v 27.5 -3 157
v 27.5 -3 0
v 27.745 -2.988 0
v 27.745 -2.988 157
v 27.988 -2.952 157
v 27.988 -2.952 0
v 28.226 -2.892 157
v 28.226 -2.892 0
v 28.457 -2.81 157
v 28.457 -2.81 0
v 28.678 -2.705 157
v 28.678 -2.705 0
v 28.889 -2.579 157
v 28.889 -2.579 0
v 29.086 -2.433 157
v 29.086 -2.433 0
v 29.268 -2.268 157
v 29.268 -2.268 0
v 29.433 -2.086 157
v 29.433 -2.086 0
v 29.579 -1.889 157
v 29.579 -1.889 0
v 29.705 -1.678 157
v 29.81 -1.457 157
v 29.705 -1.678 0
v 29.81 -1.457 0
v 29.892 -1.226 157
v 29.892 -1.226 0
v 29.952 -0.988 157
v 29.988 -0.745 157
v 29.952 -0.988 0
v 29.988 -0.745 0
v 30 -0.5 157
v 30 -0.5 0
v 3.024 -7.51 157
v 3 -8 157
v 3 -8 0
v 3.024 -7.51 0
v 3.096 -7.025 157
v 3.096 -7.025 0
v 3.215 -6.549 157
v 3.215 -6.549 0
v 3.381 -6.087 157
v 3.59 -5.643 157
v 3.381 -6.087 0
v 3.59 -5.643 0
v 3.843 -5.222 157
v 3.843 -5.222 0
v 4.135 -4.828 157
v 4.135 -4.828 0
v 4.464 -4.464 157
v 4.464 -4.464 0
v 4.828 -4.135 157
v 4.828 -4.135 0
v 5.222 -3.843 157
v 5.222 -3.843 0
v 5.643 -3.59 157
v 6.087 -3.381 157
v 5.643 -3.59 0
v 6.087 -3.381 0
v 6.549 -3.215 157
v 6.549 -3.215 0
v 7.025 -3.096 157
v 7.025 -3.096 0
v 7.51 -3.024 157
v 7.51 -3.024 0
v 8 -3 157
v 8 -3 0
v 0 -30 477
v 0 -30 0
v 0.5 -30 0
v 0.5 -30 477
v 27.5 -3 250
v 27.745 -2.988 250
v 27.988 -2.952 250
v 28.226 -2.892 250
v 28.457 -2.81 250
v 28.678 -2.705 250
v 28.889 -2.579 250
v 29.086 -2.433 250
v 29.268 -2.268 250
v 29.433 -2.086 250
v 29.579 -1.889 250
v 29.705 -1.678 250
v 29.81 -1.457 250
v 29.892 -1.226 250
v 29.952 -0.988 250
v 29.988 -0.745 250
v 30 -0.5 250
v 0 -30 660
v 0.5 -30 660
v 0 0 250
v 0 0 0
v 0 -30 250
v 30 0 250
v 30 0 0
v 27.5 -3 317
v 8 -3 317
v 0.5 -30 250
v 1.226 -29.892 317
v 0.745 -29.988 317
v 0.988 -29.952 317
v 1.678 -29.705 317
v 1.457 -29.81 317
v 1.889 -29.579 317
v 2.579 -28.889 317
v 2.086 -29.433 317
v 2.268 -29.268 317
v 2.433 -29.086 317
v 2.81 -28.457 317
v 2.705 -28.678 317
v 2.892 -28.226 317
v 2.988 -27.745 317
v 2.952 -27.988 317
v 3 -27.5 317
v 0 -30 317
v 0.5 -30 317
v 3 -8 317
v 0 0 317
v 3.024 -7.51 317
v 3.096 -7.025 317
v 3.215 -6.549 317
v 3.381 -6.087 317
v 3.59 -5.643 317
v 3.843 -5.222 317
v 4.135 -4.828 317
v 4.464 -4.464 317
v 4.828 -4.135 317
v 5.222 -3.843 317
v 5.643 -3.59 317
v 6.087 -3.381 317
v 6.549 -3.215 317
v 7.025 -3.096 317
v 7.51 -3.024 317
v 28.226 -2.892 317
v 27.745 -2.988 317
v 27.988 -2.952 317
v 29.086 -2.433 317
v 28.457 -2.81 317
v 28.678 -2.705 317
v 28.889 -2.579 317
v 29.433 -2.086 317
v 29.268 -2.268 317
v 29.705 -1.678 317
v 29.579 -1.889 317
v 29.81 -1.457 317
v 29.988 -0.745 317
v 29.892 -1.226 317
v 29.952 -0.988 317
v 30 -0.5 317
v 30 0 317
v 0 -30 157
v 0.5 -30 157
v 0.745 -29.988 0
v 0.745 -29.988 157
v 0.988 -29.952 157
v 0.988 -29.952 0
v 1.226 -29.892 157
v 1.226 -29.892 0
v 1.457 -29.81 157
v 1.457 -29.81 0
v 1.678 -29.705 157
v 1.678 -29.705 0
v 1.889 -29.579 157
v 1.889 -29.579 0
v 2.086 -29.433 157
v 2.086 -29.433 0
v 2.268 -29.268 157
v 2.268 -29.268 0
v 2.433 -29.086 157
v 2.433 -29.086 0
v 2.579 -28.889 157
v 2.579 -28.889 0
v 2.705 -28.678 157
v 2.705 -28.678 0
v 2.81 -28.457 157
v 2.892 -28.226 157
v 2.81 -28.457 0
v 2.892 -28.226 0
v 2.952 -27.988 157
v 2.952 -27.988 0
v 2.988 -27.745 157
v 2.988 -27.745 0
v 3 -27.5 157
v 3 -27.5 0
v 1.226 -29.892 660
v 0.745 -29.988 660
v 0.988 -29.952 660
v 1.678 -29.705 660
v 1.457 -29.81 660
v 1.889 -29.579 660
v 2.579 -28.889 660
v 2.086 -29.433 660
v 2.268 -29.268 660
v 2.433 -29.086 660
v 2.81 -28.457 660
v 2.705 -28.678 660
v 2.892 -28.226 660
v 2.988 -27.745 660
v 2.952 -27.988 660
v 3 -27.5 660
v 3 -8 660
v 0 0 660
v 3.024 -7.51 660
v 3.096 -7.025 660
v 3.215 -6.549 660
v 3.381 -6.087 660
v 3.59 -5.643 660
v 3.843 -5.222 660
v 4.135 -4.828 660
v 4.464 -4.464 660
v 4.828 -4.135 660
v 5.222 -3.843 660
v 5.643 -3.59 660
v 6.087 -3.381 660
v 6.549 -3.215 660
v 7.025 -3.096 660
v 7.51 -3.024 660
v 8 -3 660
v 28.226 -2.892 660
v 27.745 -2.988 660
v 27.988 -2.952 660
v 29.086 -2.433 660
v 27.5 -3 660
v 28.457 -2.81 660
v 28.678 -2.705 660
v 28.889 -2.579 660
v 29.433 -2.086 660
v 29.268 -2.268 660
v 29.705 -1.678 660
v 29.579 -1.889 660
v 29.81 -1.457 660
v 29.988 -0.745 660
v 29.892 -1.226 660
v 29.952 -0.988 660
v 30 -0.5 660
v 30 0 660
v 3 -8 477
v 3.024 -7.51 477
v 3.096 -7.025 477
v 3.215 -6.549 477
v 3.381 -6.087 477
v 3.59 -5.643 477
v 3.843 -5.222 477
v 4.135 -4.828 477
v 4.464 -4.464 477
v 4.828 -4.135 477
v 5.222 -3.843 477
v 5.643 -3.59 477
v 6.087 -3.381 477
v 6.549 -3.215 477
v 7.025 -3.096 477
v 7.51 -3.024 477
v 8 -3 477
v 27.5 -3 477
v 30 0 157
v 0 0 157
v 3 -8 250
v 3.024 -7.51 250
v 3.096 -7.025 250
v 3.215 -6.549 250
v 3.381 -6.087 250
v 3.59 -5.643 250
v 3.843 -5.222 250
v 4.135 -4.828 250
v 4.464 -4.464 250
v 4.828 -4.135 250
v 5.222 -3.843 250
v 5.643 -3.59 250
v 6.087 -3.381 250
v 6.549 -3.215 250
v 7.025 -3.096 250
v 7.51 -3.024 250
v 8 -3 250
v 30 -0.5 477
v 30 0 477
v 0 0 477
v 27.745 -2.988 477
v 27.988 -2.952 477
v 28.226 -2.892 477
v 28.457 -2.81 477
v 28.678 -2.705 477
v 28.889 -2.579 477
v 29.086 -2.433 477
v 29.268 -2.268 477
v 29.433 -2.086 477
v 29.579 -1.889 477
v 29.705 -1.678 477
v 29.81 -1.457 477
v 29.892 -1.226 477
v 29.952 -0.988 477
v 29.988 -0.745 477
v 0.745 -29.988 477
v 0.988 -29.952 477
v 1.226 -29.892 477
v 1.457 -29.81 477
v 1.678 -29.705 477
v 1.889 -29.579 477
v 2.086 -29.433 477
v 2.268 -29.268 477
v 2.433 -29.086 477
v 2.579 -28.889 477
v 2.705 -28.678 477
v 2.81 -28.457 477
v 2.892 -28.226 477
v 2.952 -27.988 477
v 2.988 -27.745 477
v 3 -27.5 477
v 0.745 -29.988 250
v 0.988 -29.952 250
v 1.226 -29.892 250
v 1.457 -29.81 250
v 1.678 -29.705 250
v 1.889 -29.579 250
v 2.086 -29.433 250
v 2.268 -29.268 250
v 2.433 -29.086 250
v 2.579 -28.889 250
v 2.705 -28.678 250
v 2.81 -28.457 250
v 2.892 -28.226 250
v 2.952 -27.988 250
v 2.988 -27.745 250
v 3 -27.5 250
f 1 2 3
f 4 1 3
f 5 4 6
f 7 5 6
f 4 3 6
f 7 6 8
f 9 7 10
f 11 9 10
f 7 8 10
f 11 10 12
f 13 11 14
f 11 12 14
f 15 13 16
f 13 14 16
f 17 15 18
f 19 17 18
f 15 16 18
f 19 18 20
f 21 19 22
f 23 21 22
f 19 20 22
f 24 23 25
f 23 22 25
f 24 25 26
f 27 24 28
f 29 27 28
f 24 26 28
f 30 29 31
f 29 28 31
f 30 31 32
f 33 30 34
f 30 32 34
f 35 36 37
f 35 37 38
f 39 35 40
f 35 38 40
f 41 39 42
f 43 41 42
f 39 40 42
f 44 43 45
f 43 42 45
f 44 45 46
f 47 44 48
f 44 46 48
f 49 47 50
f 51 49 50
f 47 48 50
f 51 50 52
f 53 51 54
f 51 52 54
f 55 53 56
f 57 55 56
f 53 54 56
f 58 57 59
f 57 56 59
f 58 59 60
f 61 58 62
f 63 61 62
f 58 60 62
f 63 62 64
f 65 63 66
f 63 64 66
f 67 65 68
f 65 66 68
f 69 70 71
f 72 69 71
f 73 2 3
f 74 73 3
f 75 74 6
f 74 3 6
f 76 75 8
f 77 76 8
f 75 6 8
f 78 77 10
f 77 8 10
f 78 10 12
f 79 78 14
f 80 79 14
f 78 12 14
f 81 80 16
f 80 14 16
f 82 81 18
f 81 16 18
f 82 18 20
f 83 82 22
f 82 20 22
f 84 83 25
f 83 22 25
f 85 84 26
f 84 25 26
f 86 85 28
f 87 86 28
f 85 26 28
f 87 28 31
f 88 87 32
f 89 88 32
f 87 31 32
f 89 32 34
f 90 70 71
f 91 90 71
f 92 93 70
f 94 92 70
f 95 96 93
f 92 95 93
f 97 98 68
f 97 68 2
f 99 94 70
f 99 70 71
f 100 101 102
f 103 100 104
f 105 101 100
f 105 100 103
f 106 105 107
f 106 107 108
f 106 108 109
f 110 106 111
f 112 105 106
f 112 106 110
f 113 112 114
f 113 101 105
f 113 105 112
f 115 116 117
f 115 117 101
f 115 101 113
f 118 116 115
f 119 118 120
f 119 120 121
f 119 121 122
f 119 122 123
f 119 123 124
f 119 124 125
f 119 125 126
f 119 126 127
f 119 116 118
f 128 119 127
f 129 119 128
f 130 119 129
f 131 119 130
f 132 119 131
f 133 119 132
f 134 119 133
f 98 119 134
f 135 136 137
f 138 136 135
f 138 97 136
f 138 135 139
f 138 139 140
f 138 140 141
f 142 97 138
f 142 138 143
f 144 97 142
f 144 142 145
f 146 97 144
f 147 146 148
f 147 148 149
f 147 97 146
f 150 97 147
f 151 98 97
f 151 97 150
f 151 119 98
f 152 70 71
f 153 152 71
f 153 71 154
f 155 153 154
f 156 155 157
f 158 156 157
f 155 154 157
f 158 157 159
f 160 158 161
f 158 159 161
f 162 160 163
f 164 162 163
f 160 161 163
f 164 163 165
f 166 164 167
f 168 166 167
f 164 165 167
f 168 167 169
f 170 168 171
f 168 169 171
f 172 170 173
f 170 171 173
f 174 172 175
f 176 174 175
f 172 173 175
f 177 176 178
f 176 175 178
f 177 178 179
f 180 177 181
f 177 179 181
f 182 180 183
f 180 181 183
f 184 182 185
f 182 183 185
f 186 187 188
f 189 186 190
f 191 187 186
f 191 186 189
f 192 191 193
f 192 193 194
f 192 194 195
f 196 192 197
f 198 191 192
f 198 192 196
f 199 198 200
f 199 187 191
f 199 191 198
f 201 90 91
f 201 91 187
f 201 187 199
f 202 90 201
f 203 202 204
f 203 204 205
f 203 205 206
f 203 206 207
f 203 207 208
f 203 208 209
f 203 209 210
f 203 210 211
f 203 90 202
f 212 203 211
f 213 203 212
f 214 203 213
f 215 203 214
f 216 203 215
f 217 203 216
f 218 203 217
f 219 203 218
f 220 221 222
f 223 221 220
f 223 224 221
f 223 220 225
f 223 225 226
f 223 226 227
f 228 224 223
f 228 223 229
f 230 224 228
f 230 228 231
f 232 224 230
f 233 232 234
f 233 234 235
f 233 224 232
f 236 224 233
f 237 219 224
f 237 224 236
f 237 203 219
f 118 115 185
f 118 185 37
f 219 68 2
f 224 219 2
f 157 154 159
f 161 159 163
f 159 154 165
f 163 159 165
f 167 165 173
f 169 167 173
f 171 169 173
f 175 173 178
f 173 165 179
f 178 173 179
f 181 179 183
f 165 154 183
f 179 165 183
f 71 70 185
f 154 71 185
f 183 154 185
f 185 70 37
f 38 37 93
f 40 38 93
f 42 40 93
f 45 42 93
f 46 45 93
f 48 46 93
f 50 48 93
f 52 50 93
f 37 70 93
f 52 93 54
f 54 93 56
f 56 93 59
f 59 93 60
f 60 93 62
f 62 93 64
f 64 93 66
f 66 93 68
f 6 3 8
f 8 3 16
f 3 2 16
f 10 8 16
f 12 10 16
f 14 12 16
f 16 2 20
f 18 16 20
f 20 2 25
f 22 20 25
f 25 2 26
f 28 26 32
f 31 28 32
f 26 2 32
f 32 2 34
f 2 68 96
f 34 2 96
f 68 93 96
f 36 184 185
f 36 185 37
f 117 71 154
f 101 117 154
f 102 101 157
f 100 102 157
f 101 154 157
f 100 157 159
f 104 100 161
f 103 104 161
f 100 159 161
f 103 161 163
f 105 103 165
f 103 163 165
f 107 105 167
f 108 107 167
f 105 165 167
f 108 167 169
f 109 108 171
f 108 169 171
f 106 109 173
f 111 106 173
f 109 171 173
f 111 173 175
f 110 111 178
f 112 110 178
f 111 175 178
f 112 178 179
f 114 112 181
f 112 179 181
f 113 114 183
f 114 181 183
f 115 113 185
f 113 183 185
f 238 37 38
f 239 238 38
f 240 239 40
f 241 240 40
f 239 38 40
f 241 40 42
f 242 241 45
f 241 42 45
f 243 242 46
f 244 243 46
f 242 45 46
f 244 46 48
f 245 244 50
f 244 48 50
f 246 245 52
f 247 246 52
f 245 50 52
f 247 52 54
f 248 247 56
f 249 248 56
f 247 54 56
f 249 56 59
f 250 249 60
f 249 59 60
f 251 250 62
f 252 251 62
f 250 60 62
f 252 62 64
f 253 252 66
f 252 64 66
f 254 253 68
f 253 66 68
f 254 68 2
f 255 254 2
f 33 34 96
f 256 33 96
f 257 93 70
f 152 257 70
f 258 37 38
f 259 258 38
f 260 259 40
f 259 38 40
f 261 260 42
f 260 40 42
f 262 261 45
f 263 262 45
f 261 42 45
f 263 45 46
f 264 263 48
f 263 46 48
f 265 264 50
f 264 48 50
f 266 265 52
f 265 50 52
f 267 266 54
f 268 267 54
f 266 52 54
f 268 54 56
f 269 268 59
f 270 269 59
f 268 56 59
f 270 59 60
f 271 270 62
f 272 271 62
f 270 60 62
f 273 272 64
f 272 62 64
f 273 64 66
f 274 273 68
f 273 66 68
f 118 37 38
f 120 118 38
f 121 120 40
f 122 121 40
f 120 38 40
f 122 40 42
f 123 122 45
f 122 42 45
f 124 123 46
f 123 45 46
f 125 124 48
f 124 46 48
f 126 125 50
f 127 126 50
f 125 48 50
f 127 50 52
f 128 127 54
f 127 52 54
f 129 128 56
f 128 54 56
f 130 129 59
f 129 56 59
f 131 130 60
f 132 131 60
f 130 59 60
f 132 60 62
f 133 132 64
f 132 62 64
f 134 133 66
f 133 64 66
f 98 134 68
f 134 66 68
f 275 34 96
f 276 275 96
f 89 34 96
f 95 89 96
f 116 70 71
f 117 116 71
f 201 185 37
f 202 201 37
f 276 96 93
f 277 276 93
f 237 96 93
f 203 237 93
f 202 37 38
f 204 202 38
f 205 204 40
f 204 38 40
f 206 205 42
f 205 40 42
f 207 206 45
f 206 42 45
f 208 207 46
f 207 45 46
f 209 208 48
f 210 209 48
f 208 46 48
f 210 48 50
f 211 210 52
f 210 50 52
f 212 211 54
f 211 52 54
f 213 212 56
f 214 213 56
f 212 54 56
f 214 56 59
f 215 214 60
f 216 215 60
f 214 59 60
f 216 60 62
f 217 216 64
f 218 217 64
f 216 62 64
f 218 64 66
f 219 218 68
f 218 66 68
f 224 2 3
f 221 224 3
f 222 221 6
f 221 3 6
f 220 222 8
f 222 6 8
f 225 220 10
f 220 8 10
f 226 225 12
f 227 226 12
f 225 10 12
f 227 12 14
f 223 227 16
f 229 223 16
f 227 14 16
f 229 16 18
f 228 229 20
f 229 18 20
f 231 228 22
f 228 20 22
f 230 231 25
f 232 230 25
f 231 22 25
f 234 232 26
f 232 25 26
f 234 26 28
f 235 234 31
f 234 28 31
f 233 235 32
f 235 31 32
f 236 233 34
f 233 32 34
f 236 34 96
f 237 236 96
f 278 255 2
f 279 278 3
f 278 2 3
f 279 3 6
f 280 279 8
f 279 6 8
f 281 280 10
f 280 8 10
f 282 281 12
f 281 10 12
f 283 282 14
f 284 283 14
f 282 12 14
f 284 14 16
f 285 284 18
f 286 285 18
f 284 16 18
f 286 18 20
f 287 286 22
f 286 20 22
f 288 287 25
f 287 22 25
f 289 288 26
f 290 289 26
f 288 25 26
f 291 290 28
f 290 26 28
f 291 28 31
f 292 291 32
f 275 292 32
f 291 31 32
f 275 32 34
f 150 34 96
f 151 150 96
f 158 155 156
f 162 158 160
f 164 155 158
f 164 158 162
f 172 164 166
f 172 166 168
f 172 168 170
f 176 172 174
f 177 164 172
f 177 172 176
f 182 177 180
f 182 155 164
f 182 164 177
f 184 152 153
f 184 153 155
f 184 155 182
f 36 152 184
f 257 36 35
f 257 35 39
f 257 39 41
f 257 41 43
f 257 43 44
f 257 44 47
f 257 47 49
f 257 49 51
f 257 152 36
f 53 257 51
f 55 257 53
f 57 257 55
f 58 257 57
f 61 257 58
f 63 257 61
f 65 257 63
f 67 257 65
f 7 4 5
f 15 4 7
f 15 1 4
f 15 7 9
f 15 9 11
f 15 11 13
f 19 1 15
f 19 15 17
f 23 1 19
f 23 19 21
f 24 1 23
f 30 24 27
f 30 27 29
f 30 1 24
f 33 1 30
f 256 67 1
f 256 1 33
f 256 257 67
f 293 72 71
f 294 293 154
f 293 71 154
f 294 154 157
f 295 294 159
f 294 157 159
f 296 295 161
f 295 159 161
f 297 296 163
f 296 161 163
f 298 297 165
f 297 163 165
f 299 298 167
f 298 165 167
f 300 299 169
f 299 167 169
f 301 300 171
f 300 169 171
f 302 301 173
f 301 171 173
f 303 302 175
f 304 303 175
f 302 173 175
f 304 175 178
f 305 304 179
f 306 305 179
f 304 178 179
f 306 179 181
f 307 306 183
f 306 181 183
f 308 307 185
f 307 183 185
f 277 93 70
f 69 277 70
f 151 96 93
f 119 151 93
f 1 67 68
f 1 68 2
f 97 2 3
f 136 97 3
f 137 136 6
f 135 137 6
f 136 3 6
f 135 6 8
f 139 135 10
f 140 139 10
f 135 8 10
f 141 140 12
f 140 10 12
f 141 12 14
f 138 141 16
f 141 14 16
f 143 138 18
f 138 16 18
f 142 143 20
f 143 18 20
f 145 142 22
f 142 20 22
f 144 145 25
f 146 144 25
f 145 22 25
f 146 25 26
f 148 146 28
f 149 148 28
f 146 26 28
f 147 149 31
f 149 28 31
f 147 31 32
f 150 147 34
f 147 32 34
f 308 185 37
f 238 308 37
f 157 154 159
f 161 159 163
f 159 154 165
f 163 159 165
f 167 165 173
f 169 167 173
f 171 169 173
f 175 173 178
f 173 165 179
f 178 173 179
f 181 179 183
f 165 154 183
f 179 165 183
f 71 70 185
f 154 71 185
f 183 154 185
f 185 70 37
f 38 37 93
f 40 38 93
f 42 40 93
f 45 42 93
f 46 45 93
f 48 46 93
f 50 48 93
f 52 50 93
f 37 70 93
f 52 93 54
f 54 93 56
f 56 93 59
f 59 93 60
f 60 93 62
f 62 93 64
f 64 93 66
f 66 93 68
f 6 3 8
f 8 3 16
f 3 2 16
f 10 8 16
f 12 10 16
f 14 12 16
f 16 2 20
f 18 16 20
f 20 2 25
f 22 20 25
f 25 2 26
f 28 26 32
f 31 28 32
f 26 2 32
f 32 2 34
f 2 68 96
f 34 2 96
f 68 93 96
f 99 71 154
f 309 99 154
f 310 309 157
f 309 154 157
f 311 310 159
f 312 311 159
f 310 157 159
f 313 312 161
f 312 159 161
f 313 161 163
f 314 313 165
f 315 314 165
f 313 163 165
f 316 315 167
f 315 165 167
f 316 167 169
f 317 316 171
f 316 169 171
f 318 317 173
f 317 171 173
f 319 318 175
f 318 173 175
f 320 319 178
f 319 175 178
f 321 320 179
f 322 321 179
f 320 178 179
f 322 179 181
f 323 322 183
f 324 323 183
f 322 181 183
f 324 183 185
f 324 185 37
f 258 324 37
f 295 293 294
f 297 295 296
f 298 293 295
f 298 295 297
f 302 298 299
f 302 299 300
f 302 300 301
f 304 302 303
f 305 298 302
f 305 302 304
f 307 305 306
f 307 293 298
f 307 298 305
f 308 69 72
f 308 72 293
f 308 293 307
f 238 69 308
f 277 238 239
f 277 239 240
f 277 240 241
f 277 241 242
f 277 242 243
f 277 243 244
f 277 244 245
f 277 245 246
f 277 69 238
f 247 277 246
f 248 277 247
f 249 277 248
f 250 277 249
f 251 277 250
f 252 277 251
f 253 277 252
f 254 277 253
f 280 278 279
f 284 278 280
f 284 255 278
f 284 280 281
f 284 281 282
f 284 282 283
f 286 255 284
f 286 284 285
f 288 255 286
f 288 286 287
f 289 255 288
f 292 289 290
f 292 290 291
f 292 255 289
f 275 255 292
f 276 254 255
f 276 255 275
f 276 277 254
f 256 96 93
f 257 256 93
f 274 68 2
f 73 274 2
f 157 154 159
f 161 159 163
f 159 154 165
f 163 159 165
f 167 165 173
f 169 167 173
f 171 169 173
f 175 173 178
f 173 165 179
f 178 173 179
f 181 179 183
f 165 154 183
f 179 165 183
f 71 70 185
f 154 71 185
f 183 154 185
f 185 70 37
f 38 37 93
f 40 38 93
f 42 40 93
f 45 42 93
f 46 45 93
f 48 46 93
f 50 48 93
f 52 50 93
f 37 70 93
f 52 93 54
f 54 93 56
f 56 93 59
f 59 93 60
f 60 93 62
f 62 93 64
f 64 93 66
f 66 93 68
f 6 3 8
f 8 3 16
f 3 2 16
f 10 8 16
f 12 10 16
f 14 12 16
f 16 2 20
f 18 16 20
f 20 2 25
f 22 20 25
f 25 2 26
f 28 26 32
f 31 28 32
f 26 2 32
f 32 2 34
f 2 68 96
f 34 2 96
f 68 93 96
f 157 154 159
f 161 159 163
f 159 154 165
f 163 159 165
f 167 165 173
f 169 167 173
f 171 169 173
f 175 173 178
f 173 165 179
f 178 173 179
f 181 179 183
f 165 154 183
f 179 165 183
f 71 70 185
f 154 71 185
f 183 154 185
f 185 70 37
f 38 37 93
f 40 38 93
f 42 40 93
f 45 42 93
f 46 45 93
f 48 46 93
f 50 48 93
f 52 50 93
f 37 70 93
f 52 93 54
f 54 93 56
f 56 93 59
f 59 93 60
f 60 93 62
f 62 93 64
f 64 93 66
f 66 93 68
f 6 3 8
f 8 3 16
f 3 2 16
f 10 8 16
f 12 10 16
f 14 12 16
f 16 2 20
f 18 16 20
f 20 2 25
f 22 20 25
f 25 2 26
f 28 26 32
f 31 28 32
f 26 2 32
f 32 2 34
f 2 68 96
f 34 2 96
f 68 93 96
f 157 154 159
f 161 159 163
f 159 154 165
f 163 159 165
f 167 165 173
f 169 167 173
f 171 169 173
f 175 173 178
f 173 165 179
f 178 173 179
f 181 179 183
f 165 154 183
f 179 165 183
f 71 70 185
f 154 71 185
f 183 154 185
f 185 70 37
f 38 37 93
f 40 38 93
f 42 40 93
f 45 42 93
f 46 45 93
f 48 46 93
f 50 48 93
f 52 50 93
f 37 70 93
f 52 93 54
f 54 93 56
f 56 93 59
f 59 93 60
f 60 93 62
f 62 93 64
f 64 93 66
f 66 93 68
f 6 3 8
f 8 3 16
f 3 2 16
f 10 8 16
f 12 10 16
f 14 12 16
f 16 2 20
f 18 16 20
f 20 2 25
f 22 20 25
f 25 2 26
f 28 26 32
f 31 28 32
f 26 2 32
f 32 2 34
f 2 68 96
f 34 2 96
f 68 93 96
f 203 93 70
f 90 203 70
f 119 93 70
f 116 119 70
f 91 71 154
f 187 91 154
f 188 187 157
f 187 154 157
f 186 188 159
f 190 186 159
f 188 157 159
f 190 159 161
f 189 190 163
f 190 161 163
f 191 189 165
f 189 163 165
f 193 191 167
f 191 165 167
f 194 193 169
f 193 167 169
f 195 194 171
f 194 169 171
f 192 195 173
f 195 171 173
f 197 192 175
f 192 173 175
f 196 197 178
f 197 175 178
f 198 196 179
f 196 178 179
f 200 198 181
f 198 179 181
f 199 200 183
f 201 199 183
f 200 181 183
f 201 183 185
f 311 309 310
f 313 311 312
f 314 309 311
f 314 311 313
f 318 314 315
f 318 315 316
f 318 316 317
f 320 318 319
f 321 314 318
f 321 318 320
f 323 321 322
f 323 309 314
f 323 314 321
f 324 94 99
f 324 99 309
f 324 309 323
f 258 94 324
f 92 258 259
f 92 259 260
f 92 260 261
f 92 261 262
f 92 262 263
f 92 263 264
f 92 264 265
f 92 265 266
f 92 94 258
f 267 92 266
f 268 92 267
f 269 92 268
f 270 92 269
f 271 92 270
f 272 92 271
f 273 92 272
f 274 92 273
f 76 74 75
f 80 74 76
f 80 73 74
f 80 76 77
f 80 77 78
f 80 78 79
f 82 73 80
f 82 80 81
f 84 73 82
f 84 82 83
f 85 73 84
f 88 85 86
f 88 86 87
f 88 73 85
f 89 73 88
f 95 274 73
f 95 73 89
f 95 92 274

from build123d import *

# Parameters (mm, degrees)
F5_DEPTH = 660
F6_DEPTH = 477
F7_DEPTH = 317
F8_DEPTH = 157
F9_DEPTH = 250


with BuildPart() as f5:
    # F4 (on Top) → F5 (new body)
    with BuildSketch(Plane.XY):
        with BuildLine():
            Line((30, 0), (0, 0))
            Line((0, 0), (0, -30))
            Line((0, -30), (0.5, -30))
            ThreePointArc((0.5, -30), (2.267766953, -29.267766953), (3, -27.5))
            Line((3, -27.5), (3, -8))
            ThreePointArc((3, -8), (4.4644660941, -4.4644660941), (8, -3))
            Line((8, -3), (27.5, -3))
            ThreePointArc((27.5, -3), (29.267766953, -2.267766953), (30, -0.5))
            Line((30, -0.5), (30, 0))
        make_face()
    extrude(amount=F5_DEPTH)


with BuildPart() as f6:
    # F4 (on Top) → F6 (new body)
    with BuildSketch(Plane.XY):
        with BuildLine():
            Line((30, 0), (0, 0))
            Line((0, 0), (0, -30))
            Line((0, -30), (0.5, -30))
            ThreePointArc((0.5, -30), (2.267766953, -29.267766953), (3, -27.5))
            Line((3, -27.5), (3, -8))
            ThreePointArc((3, -8), (4.4644660941, -4.4644660941), (8, -3))
            Line((8, -3), (27.5, -3))
            ThreePointArc((27.5, -3), (29.267766953, -2.267766953), (30, -0.5))
            Line((30, -0.5), (30, 0))
        make_face()
    extrude(amount=F6_DEPTH)


with BuildPart() as f7:
    # F4 (on Top) → F7 (new body)
    with BuildSketch(Plane.XY):
        with BuildLine():
            Line((30, 0), (0, 0))
            Line((0, 0), (0, -30))
            Line((0, -30), (0.5, -30))
            ThreePointArc((0.5, -30), (2.267766953, -29.267766953), (3, -27.5))
            Line((3, -27.5), (3, -8))
            ThreePointArc((3, -8), (4.4644660941, -4.4644660941), (8, -3))
            Line((8, -3), (27.5, -3))
            ThreePointArc((27.5, -3), (29.267766953, -2.267766953), (30, -0.5))
            Line((30, -0.5), (30, 0))
        make_face()
    extrude(amount=F7_DEPTH)


with BuildPart() as f8:
    # F4 (on Top) → F8 (new body)
    with BuildSketch(Plane.XY):
        with BuildLine():
            Line((30, 0), (0, 0))
            Line((0, 0), (0, -30))
            Line((0, -30), (0.5, -30))
            ThreePointArc((0.5, -30), (2.267766953, -29.267766953), (3, -27.5))
            Line((3, -27.5), (3, -8))
            ThreePointArc((3, -8), (4.4644660941, -4.4644660941), (8, -3))
            Line((8, -3), (27.5, -3))
            ThreePointArc((27.5, -3), (29.267766953, -2.267766953), (30, -0.5))
            Line((30, -0.5), (30, 0))
        make_face()
    extrude(amount=F8_DEPTH)


with BuildPart() as f9:
    # F4 (on Top) → F9 (new body)
    with BuildSketch(Plane.XY):
        with BuildLine():
            Line((30, 0), (0, 0))
            Line((0, 0), (0, -30))
            Line((0, -30), (0.5, -30))
            ThreePointArc((0.5, -30), (2.267766953, -29.267766953), (3, -27.5))
            Line((3, -27.5), (3, -8))
            ThreePointArc((3, -8), (4.4644660941, -4.4644660941), (8, -3))
            Line((8, -3), (27.5, -3))
            ThreePointArc((27.5, -3), (29.267766953, -2.267766953), (30, -0.5))
            Line((30, -0.5), (30, 0))
        make_face()
    extrude(amount=F9_DEPTH)


solid = Compound([f5.part, f6.part, f7.part, f8.part, f9.part])
